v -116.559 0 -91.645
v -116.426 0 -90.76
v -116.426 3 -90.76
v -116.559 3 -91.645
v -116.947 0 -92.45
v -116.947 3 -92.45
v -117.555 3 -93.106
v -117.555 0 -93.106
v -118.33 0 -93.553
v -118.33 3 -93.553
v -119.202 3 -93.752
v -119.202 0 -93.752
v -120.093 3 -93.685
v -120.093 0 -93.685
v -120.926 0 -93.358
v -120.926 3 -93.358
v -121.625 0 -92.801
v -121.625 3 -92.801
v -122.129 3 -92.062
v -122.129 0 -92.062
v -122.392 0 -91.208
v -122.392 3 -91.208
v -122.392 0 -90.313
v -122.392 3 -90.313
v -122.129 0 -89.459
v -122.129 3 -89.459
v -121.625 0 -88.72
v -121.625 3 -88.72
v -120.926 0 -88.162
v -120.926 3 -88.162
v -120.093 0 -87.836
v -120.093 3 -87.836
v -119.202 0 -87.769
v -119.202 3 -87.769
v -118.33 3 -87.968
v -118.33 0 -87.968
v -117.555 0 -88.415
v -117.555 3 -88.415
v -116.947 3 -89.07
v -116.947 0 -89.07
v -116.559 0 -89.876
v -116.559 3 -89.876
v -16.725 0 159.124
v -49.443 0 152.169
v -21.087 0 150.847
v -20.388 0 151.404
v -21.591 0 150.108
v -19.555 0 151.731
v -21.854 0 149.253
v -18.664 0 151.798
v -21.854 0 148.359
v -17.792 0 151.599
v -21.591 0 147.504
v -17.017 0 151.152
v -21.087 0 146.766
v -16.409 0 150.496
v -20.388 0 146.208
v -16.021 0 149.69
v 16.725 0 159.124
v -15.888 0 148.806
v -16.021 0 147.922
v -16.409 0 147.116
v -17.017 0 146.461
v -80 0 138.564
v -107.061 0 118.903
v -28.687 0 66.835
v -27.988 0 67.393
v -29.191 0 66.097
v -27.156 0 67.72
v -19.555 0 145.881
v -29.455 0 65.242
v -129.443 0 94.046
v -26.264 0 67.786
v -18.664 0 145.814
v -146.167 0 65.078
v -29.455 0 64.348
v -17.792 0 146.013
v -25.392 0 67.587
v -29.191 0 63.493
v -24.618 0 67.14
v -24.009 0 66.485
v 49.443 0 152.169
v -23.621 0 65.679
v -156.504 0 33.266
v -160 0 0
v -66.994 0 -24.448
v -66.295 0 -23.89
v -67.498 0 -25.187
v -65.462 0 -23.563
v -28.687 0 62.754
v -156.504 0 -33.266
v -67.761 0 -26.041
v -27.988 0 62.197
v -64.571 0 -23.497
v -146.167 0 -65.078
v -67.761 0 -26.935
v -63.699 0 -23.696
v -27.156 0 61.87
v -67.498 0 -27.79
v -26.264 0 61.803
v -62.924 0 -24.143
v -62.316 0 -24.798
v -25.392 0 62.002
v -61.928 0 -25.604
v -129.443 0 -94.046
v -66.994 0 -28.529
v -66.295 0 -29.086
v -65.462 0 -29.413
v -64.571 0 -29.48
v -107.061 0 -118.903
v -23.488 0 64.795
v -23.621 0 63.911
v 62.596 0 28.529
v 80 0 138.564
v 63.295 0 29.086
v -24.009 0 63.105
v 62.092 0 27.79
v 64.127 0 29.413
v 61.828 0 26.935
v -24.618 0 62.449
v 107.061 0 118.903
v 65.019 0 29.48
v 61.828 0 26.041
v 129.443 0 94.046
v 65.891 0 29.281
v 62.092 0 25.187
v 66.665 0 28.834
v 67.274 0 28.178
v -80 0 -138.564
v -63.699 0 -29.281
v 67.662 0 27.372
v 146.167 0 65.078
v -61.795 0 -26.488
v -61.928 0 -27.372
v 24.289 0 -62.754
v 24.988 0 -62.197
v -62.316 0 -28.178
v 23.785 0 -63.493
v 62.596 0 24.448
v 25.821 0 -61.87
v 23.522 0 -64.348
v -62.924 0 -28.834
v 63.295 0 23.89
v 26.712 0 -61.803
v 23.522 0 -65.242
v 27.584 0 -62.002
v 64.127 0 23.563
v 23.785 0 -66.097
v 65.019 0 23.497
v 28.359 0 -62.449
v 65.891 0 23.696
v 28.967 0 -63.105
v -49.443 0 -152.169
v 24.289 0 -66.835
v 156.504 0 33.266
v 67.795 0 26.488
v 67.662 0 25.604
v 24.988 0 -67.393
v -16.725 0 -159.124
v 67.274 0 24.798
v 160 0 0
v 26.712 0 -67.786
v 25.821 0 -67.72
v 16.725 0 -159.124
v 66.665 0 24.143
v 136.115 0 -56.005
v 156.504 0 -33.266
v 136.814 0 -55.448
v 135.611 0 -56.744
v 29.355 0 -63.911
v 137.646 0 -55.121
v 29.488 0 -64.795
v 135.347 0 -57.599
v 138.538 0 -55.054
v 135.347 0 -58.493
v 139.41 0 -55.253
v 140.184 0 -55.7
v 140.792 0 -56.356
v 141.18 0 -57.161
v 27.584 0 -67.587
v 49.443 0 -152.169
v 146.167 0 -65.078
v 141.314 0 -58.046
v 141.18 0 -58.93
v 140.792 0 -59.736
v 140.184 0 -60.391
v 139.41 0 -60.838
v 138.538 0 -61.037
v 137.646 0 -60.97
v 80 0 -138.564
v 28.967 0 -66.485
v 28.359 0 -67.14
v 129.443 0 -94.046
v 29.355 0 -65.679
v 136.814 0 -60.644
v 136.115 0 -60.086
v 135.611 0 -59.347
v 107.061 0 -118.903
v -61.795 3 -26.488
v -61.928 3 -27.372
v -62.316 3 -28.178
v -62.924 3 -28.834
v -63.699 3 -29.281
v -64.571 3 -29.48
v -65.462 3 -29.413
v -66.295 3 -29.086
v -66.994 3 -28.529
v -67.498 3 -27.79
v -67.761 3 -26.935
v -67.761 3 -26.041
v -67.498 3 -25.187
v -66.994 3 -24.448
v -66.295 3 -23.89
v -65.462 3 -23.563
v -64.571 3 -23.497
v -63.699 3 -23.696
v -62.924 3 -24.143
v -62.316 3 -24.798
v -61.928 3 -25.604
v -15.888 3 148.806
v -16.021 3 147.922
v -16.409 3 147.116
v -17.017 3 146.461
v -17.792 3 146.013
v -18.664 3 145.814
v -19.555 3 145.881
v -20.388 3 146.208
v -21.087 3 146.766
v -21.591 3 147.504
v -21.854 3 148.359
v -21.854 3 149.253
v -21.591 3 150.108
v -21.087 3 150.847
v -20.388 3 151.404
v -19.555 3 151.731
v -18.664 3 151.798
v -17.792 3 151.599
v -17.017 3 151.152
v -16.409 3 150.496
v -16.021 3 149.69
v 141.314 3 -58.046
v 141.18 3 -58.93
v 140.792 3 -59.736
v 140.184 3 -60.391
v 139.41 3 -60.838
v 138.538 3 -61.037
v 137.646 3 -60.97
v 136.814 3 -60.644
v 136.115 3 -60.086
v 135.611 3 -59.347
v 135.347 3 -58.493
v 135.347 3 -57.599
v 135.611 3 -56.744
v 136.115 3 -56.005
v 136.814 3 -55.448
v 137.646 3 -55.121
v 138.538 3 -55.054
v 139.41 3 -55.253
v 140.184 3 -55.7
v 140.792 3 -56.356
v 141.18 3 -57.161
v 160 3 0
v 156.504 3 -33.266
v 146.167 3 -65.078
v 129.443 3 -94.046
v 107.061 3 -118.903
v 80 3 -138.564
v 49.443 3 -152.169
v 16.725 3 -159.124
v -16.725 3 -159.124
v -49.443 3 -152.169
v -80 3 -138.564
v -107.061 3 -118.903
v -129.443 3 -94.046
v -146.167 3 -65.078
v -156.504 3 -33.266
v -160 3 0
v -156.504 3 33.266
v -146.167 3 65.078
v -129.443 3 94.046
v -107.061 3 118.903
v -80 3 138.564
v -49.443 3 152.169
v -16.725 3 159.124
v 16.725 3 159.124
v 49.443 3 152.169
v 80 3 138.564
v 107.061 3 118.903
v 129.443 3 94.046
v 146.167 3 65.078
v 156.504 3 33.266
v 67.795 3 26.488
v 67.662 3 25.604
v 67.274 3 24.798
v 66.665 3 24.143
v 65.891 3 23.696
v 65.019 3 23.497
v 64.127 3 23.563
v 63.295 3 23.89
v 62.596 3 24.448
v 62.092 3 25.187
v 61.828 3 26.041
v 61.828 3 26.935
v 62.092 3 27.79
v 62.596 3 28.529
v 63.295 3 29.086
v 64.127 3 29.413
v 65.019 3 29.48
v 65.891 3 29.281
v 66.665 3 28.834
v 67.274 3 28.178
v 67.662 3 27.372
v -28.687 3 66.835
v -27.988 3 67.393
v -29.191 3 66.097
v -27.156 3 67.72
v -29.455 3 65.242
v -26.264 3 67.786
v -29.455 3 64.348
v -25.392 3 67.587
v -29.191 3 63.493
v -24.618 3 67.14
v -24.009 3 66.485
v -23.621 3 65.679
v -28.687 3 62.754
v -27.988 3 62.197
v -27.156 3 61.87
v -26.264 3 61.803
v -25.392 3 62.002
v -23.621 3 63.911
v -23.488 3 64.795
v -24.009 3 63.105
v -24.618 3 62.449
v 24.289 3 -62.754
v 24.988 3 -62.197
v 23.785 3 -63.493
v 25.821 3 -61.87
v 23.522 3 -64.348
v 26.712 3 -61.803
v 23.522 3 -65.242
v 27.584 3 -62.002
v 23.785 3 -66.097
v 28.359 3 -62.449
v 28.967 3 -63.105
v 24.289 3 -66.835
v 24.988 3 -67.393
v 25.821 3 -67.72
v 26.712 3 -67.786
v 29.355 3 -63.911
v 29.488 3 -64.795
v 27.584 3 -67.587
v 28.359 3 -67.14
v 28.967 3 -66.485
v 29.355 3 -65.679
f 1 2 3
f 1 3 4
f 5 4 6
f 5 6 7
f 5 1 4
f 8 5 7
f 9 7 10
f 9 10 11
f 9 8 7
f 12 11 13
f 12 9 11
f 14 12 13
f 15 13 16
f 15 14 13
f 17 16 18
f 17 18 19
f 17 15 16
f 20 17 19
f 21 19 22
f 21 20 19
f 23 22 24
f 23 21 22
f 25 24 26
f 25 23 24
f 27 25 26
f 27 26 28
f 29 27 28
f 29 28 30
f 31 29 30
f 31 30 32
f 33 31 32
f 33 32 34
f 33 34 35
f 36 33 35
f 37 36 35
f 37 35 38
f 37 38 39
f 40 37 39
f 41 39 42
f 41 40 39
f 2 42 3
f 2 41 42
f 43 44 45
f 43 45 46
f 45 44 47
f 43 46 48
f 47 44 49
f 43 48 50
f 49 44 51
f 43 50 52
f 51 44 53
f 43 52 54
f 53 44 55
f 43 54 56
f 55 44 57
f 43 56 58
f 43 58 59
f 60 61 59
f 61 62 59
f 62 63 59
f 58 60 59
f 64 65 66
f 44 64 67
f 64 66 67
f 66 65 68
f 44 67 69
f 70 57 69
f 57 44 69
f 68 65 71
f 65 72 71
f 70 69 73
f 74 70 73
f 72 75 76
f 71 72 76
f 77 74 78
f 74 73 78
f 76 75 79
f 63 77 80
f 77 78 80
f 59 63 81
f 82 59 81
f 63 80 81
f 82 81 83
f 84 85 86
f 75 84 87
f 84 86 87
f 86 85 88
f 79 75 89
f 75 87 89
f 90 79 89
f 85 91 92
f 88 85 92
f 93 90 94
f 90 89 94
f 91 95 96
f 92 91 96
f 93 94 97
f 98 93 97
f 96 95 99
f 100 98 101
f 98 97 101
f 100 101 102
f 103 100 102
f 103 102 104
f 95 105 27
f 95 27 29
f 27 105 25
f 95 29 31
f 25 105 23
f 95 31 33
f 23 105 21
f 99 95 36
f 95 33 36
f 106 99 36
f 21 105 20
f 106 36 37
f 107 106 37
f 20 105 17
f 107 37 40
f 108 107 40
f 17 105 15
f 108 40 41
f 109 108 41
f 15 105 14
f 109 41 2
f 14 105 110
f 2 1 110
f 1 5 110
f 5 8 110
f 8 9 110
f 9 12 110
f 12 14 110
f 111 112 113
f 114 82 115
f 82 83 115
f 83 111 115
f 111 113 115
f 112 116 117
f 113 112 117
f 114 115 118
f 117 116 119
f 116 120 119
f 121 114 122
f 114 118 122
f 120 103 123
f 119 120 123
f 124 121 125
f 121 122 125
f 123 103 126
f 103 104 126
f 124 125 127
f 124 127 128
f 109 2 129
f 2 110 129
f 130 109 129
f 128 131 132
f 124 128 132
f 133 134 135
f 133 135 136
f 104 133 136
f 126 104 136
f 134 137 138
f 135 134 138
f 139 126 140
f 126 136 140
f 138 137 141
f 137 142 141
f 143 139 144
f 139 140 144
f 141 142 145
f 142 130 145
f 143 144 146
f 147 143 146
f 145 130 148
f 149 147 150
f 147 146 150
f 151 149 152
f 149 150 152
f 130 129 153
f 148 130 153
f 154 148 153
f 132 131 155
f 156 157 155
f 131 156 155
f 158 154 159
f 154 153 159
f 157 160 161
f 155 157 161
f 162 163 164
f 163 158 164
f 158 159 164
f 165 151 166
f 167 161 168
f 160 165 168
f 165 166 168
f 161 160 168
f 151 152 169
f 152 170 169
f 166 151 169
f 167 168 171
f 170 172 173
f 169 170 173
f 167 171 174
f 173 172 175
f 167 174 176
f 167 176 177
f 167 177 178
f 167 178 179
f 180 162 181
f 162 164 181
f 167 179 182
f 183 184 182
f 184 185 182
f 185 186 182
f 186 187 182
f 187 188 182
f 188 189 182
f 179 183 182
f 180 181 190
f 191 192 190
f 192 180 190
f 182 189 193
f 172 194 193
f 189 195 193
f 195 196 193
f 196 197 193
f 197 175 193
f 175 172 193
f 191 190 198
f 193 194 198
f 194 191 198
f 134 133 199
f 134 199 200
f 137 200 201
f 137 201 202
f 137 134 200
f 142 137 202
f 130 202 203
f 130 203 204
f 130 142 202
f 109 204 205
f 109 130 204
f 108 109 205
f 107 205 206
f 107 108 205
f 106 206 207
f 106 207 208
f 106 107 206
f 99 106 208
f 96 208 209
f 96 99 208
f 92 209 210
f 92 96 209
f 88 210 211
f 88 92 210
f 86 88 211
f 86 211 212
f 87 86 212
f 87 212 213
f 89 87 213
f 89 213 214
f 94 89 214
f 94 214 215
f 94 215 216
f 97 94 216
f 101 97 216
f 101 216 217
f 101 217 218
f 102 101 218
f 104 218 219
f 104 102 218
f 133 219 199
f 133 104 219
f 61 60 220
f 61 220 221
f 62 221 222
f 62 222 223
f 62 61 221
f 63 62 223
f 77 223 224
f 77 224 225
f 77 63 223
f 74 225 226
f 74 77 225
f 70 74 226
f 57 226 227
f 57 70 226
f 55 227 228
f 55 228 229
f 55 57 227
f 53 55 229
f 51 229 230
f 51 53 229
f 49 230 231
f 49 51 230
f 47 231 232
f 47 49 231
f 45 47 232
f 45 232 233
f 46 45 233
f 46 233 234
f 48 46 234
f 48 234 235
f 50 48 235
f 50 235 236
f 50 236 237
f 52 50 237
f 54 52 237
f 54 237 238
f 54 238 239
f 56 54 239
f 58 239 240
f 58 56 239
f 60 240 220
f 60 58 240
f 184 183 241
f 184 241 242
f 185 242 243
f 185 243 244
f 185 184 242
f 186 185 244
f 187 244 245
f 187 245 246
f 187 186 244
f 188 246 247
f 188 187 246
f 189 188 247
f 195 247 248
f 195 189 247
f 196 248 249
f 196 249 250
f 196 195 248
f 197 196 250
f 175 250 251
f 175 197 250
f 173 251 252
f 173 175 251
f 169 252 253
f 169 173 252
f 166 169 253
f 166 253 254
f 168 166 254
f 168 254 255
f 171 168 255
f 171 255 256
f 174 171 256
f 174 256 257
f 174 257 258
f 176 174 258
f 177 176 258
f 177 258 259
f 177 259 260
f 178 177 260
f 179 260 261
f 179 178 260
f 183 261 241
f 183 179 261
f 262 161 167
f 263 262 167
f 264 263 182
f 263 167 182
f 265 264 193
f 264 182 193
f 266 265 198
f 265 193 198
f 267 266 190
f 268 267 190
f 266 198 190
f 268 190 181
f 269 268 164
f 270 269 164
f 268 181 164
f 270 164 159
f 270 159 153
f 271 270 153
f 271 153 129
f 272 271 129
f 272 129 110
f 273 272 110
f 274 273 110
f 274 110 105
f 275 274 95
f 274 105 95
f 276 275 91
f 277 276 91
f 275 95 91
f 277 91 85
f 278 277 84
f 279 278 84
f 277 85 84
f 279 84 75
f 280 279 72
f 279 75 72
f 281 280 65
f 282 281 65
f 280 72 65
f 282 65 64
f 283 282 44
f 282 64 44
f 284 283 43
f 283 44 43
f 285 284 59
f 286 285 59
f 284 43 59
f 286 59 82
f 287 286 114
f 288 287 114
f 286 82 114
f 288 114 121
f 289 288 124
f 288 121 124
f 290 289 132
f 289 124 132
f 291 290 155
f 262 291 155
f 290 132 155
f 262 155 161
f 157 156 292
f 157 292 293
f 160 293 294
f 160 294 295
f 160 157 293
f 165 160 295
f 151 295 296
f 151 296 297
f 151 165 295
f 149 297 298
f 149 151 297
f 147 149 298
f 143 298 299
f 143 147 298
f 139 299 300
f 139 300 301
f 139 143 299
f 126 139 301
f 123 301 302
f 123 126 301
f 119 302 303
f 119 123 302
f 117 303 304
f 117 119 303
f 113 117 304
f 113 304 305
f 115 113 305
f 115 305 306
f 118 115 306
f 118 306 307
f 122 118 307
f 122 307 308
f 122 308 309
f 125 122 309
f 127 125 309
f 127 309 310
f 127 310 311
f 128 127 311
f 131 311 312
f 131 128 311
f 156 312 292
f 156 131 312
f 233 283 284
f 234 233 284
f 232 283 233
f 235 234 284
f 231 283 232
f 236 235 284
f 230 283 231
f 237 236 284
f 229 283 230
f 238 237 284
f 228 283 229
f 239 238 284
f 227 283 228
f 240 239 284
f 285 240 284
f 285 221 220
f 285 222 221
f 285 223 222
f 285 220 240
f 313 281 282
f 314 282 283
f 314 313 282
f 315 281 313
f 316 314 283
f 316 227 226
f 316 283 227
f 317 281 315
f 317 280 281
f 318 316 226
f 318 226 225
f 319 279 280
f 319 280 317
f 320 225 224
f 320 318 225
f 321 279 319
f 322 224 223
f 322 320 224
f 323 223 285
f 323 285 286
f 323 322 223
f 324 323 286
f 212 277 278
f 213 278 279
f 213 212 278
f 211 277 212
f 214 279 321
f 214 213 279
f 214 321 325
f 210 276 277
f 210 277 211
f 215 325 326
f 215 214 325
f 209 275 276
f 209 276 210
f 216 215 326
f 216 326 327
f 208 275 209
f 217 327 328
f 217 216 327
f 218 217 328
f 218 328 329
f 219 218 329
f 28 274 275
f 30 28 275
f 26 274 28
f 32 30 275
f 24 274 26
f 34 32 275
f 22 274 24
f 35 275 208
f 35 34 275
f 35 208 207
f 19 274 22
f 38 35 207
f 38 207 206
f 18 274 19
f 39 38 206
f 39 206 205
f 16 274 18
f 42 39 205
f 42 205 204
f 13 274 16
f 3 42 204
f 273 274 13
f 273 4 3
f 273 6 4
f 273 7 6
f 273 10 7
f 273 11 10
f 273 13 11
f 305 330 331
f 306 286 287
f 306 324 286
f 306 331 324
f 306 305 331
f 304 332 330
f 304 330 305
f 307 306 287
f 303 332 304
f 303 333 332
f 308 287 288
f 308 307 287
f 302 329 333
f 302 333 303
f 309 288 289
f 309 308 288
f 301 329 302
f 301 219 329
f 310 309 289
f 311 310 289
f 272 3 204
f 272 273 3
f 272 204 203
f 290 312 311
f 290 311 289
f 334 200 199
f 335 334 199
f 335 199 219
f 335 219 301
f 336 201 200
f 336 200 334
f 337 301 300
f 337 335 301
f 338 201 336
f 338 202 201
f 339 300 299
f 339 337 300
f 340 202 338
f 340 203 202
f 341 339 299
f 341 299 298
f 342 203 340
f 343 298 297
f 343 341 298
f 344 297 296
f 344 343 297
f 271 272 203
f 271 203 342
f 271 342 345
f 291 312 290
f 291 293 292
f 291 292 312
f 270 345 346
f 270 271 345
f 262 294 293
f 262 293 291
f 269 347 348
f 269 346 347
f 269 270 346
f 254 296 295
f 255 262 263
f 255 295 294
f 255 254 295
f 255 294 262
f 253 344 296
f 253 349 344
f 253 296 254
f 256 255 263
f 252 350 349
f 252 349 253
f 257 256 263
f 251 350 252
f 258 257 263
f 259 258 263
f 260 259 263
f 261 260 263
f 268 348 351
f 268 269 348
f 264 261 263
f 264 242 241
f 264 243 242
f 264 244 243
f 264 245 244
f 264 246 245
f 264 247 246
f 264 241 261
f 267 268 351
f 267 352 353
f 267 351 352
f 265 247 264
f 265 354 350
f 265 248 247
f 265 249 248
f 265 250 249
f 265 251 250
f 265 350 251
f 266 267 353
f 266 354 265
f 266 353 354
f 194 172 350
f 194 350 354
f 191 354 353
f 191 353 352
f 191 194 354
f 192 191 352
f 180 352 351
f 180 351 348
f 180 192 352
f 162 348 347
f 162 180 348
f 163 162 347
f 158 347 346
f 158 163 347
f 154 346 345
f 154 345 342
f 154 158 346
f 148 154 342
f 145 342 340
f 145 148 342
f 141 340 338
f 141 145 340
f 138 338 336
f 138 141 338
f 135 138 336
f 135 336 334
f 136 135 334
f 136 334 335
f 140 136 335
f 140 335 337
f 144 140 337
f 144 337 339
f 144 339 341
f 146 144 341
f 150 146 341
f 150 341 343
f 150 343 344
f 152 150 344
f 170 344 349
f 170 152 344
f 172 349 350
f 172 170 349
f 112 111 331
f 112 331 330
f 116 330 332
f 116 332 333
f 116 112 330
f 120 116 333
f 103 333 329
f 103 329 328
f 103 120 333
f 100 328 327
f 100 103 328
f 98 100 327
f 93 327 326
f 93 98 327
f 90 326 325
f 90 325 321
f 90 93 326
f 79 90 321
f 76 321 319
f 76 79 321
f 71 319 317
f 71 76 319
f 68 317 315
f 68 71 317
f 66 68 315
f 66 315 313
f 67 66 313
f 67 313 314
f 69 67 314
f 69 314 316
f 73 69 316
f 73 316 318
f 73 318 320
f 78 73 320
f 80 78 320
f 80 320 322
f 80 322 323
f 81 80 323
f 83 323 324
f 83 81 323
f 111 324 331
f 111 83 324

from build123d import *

# Parameters (mm, degrees)
CROQUIS1_R              = 160
CROQUIS1_R_2            = 3
SALIENTE_EXTRUIR2_DEPTH = 3


with BuildPart() as part:
    # Croquis1 → Saliente-Extruir2 (new body)
    with BuildSketch(Plane(origin=(0, 0, 0), x_dir=(1, 0, 0), z_dir=(0, 1, 0))):
        Circle(CROQUIS1_R)
        with Locations((138.31376779, 58.045685797)):
            Circle(CROQUIS1_R_2, mode=Mode.SUBTRACT)
        with Locations((-18.887845415, -148.806079498)):
            Circle(CROQUIS1_R_2, mode=Mode.SUBTRACT)
        with Locations((-64.794876894, 26.488184691)):
            Circle(CROQUIS1_R_2, mode=Mode.SUBTRACT)
        with Locations((26.488184691, 64.794876894)):
            Circle(CROQUIS1_R_2, mode=Mode.SUBTRACT)
        with Locations((64.794876894, -26.488184691)):
            Circle(CROQUIS1_R_2, mode=Mode.SUBTRACT)
        with Locations((-26.488184691, -64.794876894)):
            Circle(CROQUIS1_R_2, mode=Mode.SUBTRACT)
        with Locations((-119.425922375, 90.760393701)):
            Circle(CROQUIS1_R_2, mode=Mode.SUBTRACT)
    extrude(amount=SALIENTE_EXTRUIR2_DEPTH)


solid = part.part
